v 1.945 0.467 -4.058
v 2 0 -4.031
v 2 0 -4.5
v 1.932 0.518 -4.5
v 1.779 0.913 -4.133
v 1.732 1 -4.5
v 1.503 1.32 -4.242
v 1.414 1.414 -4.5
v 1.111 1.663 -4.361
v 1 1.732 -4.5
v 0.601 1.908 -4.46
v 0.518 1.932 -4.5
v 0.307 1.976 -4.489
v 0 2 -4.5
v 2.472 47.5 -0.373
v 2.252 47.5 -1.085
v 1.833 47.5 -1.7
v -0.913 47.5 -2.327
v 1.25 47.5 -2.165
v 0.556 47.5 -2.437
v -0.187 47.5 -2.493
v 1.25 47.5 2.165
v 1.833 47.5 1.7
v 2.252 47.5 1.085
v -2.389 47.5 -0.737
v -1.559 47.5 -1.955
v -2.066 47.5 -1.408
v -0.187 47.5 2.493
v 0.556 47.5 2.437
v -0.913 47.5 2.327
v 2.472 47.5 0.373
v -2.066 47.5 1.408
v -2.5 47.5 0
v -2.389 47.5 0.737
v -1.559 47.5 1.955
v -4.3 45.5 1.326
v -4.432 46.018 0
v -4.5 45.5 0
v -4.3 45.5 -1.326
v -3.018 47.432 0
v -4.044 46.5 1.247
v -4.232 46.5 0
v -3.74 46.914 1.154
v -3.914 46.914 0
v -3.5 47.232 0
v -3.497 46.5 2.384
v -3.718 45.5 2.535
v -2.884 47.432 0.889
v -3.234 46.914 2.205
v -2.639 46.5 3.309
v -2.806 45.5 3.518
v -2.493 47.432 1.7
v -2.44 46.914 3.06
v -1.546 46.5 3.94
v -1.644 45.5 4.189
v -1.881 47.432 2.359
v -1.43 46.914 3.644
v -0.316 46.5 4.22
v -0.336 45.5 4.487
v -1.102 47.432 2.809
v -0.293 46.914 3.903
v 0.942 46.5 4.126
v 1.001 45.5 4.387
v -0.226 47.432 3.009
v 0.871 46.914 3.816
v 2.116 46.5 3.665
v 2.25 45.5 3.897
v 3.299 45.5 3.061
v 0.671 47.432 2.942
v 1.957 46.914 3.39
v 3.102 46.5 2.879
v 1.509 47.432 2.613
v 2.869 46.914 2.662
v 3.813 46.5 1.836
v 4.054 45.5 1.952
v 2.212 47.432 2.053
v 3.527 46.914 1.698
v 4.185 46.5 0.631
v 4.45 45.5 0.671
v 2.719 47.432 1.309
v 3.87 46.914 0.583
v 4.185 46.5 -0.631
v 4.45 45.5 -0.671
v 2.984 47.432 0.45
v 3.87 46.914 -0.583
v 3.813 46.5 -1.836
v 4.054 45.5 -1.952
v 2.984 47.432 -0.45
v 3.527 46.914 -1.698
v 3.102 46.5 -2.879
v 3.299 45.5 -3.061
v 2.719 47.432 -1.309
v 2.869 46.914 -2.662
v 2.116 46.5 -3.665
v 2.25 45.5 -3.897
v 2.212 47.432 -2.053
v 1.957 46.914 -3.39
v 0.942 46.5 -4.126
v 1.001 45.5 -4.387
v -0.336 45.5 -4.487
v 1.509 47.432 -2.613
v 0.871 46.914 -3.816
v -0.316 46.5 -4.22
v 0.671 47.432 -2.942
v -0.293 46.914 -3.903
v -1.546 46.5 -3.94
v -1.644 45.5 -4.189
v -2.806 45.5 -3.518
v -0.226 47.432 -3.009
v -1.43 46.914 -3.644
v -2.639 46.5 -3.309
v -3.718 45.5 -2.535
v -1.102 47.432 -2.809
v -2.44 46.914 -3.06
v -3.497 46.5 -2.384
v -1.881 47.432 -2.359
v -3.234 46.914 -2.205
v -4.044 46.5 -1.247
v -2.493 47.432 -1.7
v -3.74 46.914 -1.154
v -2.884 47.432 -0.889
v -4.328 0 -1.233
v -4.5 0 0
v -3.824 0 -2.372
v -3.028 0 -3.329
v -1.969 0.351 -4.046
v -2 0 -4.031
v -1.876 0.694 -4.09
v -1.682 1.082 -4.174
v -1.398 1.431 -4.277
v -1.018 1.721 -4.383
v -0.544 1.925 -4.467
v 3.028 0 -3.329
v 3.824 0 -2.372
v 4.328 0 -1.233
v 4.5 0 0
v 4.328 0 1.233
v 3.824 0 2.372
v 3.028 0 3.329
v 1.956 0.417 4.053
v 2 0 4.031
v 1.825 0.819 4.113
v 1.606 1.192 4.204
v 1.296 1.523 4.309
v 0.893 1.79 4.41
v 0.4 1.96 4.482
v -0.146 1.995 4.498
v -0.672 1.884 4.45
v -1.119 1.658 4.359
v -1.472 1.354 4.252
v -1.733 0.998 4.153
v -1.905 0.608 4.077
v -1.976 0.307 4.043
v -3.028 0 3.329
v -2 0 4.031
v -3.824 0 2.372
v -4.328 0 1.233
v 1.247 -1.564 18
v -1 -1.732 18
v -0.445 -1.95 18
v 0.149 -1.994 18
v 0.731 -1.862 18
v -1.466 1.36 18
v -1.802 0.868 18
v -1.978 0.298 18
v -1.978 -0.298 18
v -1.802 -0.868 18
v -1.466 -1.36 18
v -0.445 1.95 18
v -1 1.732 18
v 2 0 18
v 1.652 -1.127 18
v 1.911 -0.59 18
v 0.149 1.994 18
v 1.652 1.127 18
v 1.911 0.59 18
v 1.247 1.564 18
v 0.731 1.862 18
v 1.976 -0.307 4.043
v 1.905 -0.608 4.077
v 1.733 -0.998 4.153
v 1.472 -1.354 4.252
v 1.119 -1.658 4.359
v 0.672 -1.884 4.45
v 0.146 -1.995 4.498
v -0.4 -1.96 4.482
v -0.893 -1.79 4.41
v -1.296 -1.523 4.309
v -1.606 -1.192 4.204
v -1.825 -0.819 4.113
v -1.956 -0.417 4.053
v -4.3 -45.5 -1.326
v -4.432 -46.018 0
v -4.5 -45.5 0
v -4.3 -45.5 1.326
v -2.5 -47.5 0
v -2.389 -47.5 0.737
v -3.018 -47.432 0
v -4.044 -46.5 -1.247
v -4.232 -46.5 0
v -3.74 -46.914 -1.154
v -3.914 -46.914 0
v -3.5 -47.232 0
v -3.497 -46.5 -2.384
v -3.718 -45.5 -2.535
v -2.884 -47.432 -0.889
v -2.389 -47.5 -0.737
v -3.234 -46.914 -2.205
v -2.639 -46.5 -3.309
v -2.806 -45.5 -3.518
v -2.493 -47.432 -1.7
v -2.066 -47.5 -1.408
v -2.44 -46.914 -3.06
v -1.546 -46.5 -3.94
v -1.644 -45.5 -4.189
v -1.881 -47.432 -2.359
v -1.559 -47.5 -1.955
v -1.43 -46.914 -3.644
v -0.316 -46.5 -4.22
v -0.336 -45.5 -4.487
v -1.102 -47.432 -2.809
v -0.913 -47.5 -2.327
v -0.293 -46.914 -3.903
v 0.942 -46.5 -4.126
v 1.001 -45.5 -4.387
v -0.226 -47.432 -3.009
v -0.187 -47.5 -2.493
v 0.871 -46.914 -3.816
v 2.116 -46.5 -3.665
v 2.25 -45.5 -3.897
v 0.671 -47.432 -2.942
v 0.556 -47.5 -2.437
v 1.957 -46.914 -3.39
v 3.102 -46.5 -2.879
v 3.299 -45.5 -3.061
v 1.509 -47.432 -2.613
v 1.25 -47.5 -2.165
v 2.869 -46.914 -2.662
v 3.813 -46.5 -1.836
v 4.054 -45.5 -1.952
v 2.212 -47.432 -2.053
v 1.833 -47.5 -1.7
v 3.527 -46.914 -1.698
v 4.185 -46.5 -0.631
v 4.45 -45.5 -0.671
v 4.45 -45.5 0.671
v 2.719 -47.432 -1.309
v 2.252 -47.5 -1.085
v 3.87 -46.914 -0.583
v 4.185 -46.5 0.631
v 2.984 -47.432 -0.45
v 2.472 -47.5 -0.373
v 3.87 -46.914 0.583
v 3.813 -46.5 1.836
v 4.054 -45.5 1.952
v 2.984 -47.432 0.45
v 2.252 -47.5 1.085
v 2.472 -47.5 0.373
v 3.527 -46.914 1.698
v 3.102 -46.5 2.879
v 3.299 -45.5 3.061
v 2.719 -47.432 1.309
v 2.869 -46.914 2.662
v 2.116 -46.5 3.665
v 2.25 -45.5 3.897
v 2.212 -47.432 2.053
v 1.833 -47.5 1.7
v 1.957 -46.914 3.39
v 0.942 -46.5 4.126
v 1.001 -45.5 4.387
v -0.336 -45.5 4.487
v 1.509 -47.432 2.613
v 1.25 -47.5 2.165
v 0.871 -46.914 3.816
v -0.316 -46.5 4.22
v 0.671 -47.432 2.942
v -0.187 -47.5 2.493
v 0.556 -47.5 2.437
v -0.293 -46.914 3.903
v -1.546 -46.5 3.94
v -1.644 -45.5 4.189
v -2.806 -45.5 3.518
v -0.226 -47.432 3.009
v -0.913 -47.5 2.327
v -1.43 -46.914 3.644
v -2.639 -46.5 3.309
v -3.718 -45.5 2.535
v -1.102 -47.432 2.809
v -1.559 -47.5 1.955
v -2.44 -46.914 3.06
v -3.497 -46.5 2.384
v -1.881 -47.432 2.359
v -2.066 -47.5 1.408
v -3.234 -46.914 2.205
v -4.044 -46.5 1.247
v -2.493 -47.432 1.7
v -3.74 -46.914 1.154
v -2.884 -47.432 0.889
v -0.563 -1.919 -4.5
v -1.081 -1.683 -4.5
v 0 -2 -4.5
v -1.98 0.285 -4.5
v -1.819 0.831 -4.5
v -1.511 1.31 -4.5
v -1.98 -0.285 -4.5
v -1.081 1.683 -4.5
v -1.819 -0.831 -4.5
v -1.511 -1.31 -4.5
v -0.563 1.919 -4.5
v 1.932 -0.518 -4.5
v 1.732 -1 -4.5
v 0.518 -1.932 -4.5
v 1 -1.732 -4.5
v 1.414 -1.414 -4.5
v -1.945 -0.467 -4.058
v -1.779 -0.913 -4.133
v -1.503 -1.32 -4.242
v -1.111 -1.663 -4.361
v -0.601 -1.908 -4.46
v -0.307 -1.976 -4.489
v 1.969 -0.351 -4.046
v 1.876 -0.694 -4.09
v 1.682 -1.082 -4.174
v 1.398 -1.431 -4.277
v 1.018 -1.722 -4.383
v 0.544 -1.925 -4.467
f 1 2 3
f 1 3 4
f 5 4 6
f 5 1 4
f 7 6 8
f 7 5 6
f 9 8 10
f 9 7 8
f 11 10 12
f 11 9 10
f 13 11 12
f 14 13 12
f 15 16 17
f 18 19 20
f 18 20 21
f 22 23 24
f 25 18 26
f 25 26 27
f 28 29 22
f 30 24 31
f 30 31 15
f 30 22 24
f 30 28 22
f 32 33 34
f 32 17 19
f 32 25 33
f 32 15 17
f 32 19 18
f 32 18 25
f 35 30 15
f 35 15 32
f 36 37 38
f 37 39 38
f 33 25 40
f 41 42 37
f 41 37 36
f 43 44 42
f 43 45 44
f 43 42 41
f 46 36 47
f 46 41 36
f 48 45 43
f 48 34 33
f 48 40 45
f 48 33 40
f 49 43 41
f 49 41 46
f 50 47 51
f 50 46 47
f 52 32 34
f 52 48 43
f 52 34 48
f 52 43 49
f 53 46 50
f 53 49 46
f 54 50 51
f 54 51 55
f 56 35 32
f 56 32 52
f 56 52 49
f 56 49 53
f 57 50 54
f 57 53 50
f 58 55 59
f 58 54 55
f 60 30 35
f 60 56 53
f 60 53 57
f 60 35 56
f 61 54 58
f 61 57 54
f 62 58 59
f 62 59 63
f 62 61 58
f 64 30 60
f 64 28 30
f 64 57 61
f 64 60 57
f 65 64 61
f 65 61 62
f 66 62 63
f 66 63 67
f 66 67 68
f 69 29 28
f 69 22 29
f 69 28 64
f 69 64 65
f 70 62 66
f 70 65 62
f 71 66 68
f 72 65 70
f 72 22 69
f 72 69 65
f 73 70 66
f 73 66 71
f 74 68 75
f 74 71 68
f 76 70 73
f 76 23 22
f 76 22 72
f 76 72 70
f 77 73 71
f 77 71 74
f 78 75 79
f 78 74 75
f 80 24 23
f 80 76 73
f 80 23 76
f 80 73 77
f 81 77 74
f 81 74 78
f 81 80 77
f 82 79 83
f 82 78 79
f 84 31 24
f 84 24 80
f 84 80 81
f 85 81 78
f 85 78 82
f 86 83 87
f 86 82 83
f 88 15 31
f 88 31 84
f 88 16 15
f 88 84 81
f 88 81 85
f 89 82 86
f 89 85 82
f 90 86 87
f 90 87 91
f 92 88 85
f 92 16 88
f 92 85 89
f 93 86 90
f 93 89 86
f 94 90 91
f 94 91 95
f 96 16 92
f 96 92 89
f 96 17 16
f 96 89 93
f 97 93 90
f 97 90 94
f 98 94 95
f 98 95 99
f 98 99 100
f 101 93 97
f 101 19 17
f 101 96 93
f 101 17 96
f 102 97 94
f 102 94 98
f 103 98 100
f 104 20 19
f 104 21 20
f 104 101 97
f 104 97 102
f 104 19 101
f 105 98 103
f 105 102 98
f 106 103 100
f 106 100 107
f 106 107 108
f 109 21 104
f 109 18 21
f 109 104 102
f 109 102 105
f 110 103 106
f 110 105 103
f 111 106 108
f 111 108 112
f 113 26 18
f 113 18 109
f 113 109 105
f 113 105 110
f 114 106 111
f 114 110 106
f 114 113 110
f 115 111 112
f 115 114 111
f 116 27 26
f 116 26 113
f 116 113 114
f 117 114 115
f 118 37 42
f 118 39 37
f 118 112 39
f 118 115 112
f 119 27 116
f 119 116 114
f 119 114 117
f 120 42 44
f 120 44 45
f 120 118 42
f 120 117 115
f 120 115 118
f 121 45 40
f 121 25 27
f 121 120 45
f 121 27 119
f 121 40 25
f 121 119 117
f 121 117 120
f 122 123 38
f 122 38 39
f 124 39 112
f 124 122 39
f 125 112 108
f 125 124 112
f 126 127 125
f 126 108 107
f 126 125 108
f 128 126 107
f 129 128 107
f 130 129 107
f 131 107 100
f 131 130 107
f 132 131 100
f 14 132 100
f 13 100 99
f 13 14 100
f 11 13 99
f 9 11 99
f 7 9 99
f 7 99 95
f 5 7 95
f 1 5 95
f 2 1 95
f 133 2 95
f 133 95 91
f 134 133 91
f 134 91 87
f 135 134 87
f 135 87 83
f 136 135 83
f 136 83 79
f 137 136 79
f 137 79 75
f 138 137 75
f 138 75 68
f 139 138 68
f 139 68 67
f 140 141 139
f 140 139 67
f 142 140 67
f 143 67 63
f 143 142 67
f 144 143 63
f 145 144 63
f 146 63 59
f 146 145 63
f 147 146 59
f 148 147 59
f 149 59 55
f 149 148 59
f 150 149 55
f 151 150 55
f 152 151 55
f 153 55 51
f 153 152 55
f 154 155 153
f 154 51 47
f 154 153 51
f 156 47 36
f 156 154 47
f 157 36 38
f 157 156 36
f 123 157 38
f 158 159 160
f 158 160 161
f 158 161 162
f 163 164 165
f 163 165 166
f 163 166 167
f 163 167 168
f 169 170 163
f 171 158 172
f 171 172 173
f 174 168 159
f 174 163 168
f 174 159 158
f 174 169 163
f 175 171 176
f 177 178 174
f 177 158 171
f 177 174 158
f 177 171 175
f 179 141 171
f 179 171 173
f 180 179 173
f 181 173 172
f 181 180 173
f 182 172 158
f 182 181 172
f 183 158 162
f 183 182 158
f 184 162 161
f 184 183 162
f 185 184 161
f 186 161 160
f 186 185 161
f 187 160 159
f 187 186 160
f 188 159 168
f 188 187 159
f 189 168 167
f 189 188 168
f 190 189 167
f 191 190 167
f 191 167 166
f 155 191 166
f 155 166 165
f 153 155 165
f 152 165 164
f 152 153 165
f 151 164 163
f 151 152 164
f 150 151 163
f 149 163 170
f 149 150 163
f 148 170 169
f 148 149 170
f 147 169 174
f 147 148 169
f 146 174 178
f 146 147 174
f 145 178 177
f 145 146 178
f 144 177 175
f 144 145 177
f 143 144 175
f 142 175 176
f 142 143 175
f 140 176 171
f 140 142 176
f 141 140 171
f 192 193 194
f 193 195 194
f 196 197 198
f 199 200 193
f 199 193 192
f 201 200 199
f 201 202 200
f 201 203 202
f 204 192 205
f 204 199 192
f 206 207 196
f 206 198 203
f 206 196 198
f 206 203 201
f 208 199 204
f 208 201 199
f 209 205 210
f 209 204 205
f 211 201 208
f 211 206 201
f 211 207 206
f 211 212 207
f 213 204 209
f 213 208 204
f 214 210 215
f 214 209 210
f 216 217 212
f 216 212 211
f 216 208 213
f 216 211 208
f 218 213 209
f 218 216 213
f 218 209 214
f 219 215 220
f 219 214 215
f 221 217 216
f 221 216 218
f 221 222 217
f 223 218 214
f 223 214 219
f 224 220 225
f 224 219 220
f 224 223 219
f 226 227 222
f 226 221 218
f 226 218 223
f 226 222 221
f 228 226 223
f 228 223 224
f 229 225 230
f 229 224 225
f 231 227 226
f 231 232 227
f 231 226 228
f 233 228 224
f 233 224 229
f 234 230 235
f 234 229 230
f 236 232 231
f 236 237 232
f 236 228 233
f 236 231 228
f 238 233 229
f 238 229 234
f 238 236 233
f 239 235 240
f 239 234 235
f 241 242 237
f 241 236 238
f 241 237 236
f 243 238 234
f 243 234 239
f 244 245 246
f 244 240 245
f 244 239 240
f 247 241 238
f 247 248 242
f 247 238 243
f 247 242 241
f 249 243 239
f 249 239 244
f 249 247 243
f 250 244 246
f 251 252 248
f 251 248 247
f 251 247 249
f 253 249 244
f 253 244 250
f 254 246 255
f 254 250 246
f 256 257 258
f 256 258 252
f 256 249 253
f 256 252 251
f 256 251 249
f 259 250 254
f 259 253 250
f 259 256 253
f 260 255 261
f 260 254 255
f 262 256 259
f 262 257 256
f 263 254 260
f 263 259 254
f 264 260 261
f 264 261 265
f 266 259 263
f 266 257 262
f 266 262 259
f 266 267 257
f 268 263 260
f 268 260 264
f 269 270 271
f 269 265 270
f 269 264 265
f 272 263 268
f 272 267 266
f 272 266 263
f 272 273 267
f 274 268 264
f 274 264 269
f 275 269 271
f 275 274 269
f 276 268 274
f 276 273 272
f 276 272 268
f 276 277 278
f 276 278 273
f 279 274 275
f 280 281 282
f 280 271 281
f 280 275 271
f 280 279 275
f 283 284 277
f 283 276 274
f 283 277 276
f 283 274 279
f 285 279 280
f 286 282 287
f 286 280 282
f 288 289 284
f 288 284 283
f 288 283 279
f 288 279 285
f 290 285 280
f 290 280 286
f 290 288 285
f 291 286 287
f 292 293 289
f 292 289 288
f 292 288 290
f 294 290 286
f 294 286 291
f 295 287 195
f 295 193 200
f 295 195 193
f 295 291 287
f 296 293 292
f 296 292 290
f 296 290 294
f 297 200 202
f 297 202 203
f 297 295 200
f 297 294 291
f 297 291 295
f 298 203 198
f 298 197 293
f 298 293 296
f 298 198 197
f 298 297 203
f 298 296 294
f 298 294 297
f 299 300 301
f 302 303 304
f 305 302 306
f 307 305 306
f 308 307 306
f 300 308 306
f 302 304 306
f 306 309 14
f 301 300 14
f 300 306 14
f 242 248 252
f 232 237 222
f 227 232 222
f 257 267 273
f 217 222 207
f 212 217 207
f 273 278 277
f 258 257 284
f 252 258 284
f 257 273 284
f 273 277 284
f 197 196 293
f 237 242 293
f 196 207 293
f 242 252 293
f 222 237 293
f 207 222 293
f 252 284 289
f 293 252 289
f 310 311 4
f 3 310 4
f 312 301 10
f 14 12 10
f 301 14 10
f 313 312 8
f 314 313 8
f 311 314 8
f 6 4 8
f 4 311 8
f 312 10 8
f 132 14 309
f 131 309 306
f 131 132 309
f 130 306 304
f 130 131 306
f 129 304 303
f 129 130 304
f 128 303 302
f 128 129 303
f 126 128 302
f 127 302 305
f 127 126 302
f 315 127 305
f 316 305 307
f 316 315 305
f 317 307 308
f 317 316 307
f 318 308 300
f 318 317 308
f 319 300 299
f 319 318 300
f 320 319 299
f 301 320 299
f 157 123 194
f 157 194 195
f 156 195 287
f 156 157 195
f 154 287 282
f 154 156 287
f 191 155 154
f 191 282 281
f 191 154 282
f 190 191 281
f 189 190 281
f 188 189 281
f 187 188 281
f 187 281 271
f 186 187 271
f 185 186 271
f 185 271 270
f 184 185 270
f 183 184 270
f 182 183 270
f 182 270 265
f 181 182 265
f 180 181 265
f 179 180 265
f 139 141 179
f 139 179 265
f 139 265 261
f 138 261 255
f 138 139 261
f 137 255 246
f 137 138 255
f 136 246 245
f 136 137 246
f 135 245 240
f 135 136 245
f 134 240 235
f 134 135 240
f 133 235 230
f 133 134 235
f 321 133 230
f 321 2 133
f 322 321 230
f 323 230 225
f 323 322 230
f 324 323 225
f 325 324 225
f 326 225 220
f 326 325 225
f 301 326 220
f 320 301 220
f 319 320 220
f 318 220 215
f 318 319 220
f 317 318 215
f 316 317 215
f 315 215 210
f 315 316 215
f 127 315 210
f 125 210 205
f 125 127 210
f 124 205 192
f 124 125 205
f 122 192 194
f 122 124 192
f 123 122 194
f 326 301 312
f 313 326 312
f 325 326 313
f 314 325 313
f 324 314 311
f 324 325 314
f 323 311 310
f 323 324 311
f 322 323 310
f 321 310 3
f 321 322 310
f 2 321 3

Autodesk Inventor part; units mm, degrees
ref_plane "YZ Plane" through (0, 0, 0) normal (1, 0, 0) x (0, 1, 0)
ref_plane "XZ Plane" through (0, 0, 0) normal (0, 1, 0) x (-1, 0, 0)
ref_plane "XY Plane" through (0, 0, 0) normal (0, 0, 1) x (1, 0, 0)
sketch "Sketch1" plane through (0, 0, 0) normal (0, 1, 0) x (-1, 0, 0)
  circle A0 centre (0, 0) radius 4.5
  dimension "d0" = 9
extrude "Extrusion1" add sketch "Sketch1" along normal mid plane 95
fillet "Fillet1" radius 2 2 edges at (4.5, 47.5, 0) (4.5, -47.5, 0)
sketch "Sketch2" plane through (0, 0, 0) normal (0, 0, 1) x (1, 0, 0)
  circle A0 centre (0, 0) radius 2
  dimension "d4" = 4
extrude "Extrusion2" add sketch "Sketch2" along normal blind 18 and the other way blind 4.5
properties part number "Part2pasador" material "Steel"
